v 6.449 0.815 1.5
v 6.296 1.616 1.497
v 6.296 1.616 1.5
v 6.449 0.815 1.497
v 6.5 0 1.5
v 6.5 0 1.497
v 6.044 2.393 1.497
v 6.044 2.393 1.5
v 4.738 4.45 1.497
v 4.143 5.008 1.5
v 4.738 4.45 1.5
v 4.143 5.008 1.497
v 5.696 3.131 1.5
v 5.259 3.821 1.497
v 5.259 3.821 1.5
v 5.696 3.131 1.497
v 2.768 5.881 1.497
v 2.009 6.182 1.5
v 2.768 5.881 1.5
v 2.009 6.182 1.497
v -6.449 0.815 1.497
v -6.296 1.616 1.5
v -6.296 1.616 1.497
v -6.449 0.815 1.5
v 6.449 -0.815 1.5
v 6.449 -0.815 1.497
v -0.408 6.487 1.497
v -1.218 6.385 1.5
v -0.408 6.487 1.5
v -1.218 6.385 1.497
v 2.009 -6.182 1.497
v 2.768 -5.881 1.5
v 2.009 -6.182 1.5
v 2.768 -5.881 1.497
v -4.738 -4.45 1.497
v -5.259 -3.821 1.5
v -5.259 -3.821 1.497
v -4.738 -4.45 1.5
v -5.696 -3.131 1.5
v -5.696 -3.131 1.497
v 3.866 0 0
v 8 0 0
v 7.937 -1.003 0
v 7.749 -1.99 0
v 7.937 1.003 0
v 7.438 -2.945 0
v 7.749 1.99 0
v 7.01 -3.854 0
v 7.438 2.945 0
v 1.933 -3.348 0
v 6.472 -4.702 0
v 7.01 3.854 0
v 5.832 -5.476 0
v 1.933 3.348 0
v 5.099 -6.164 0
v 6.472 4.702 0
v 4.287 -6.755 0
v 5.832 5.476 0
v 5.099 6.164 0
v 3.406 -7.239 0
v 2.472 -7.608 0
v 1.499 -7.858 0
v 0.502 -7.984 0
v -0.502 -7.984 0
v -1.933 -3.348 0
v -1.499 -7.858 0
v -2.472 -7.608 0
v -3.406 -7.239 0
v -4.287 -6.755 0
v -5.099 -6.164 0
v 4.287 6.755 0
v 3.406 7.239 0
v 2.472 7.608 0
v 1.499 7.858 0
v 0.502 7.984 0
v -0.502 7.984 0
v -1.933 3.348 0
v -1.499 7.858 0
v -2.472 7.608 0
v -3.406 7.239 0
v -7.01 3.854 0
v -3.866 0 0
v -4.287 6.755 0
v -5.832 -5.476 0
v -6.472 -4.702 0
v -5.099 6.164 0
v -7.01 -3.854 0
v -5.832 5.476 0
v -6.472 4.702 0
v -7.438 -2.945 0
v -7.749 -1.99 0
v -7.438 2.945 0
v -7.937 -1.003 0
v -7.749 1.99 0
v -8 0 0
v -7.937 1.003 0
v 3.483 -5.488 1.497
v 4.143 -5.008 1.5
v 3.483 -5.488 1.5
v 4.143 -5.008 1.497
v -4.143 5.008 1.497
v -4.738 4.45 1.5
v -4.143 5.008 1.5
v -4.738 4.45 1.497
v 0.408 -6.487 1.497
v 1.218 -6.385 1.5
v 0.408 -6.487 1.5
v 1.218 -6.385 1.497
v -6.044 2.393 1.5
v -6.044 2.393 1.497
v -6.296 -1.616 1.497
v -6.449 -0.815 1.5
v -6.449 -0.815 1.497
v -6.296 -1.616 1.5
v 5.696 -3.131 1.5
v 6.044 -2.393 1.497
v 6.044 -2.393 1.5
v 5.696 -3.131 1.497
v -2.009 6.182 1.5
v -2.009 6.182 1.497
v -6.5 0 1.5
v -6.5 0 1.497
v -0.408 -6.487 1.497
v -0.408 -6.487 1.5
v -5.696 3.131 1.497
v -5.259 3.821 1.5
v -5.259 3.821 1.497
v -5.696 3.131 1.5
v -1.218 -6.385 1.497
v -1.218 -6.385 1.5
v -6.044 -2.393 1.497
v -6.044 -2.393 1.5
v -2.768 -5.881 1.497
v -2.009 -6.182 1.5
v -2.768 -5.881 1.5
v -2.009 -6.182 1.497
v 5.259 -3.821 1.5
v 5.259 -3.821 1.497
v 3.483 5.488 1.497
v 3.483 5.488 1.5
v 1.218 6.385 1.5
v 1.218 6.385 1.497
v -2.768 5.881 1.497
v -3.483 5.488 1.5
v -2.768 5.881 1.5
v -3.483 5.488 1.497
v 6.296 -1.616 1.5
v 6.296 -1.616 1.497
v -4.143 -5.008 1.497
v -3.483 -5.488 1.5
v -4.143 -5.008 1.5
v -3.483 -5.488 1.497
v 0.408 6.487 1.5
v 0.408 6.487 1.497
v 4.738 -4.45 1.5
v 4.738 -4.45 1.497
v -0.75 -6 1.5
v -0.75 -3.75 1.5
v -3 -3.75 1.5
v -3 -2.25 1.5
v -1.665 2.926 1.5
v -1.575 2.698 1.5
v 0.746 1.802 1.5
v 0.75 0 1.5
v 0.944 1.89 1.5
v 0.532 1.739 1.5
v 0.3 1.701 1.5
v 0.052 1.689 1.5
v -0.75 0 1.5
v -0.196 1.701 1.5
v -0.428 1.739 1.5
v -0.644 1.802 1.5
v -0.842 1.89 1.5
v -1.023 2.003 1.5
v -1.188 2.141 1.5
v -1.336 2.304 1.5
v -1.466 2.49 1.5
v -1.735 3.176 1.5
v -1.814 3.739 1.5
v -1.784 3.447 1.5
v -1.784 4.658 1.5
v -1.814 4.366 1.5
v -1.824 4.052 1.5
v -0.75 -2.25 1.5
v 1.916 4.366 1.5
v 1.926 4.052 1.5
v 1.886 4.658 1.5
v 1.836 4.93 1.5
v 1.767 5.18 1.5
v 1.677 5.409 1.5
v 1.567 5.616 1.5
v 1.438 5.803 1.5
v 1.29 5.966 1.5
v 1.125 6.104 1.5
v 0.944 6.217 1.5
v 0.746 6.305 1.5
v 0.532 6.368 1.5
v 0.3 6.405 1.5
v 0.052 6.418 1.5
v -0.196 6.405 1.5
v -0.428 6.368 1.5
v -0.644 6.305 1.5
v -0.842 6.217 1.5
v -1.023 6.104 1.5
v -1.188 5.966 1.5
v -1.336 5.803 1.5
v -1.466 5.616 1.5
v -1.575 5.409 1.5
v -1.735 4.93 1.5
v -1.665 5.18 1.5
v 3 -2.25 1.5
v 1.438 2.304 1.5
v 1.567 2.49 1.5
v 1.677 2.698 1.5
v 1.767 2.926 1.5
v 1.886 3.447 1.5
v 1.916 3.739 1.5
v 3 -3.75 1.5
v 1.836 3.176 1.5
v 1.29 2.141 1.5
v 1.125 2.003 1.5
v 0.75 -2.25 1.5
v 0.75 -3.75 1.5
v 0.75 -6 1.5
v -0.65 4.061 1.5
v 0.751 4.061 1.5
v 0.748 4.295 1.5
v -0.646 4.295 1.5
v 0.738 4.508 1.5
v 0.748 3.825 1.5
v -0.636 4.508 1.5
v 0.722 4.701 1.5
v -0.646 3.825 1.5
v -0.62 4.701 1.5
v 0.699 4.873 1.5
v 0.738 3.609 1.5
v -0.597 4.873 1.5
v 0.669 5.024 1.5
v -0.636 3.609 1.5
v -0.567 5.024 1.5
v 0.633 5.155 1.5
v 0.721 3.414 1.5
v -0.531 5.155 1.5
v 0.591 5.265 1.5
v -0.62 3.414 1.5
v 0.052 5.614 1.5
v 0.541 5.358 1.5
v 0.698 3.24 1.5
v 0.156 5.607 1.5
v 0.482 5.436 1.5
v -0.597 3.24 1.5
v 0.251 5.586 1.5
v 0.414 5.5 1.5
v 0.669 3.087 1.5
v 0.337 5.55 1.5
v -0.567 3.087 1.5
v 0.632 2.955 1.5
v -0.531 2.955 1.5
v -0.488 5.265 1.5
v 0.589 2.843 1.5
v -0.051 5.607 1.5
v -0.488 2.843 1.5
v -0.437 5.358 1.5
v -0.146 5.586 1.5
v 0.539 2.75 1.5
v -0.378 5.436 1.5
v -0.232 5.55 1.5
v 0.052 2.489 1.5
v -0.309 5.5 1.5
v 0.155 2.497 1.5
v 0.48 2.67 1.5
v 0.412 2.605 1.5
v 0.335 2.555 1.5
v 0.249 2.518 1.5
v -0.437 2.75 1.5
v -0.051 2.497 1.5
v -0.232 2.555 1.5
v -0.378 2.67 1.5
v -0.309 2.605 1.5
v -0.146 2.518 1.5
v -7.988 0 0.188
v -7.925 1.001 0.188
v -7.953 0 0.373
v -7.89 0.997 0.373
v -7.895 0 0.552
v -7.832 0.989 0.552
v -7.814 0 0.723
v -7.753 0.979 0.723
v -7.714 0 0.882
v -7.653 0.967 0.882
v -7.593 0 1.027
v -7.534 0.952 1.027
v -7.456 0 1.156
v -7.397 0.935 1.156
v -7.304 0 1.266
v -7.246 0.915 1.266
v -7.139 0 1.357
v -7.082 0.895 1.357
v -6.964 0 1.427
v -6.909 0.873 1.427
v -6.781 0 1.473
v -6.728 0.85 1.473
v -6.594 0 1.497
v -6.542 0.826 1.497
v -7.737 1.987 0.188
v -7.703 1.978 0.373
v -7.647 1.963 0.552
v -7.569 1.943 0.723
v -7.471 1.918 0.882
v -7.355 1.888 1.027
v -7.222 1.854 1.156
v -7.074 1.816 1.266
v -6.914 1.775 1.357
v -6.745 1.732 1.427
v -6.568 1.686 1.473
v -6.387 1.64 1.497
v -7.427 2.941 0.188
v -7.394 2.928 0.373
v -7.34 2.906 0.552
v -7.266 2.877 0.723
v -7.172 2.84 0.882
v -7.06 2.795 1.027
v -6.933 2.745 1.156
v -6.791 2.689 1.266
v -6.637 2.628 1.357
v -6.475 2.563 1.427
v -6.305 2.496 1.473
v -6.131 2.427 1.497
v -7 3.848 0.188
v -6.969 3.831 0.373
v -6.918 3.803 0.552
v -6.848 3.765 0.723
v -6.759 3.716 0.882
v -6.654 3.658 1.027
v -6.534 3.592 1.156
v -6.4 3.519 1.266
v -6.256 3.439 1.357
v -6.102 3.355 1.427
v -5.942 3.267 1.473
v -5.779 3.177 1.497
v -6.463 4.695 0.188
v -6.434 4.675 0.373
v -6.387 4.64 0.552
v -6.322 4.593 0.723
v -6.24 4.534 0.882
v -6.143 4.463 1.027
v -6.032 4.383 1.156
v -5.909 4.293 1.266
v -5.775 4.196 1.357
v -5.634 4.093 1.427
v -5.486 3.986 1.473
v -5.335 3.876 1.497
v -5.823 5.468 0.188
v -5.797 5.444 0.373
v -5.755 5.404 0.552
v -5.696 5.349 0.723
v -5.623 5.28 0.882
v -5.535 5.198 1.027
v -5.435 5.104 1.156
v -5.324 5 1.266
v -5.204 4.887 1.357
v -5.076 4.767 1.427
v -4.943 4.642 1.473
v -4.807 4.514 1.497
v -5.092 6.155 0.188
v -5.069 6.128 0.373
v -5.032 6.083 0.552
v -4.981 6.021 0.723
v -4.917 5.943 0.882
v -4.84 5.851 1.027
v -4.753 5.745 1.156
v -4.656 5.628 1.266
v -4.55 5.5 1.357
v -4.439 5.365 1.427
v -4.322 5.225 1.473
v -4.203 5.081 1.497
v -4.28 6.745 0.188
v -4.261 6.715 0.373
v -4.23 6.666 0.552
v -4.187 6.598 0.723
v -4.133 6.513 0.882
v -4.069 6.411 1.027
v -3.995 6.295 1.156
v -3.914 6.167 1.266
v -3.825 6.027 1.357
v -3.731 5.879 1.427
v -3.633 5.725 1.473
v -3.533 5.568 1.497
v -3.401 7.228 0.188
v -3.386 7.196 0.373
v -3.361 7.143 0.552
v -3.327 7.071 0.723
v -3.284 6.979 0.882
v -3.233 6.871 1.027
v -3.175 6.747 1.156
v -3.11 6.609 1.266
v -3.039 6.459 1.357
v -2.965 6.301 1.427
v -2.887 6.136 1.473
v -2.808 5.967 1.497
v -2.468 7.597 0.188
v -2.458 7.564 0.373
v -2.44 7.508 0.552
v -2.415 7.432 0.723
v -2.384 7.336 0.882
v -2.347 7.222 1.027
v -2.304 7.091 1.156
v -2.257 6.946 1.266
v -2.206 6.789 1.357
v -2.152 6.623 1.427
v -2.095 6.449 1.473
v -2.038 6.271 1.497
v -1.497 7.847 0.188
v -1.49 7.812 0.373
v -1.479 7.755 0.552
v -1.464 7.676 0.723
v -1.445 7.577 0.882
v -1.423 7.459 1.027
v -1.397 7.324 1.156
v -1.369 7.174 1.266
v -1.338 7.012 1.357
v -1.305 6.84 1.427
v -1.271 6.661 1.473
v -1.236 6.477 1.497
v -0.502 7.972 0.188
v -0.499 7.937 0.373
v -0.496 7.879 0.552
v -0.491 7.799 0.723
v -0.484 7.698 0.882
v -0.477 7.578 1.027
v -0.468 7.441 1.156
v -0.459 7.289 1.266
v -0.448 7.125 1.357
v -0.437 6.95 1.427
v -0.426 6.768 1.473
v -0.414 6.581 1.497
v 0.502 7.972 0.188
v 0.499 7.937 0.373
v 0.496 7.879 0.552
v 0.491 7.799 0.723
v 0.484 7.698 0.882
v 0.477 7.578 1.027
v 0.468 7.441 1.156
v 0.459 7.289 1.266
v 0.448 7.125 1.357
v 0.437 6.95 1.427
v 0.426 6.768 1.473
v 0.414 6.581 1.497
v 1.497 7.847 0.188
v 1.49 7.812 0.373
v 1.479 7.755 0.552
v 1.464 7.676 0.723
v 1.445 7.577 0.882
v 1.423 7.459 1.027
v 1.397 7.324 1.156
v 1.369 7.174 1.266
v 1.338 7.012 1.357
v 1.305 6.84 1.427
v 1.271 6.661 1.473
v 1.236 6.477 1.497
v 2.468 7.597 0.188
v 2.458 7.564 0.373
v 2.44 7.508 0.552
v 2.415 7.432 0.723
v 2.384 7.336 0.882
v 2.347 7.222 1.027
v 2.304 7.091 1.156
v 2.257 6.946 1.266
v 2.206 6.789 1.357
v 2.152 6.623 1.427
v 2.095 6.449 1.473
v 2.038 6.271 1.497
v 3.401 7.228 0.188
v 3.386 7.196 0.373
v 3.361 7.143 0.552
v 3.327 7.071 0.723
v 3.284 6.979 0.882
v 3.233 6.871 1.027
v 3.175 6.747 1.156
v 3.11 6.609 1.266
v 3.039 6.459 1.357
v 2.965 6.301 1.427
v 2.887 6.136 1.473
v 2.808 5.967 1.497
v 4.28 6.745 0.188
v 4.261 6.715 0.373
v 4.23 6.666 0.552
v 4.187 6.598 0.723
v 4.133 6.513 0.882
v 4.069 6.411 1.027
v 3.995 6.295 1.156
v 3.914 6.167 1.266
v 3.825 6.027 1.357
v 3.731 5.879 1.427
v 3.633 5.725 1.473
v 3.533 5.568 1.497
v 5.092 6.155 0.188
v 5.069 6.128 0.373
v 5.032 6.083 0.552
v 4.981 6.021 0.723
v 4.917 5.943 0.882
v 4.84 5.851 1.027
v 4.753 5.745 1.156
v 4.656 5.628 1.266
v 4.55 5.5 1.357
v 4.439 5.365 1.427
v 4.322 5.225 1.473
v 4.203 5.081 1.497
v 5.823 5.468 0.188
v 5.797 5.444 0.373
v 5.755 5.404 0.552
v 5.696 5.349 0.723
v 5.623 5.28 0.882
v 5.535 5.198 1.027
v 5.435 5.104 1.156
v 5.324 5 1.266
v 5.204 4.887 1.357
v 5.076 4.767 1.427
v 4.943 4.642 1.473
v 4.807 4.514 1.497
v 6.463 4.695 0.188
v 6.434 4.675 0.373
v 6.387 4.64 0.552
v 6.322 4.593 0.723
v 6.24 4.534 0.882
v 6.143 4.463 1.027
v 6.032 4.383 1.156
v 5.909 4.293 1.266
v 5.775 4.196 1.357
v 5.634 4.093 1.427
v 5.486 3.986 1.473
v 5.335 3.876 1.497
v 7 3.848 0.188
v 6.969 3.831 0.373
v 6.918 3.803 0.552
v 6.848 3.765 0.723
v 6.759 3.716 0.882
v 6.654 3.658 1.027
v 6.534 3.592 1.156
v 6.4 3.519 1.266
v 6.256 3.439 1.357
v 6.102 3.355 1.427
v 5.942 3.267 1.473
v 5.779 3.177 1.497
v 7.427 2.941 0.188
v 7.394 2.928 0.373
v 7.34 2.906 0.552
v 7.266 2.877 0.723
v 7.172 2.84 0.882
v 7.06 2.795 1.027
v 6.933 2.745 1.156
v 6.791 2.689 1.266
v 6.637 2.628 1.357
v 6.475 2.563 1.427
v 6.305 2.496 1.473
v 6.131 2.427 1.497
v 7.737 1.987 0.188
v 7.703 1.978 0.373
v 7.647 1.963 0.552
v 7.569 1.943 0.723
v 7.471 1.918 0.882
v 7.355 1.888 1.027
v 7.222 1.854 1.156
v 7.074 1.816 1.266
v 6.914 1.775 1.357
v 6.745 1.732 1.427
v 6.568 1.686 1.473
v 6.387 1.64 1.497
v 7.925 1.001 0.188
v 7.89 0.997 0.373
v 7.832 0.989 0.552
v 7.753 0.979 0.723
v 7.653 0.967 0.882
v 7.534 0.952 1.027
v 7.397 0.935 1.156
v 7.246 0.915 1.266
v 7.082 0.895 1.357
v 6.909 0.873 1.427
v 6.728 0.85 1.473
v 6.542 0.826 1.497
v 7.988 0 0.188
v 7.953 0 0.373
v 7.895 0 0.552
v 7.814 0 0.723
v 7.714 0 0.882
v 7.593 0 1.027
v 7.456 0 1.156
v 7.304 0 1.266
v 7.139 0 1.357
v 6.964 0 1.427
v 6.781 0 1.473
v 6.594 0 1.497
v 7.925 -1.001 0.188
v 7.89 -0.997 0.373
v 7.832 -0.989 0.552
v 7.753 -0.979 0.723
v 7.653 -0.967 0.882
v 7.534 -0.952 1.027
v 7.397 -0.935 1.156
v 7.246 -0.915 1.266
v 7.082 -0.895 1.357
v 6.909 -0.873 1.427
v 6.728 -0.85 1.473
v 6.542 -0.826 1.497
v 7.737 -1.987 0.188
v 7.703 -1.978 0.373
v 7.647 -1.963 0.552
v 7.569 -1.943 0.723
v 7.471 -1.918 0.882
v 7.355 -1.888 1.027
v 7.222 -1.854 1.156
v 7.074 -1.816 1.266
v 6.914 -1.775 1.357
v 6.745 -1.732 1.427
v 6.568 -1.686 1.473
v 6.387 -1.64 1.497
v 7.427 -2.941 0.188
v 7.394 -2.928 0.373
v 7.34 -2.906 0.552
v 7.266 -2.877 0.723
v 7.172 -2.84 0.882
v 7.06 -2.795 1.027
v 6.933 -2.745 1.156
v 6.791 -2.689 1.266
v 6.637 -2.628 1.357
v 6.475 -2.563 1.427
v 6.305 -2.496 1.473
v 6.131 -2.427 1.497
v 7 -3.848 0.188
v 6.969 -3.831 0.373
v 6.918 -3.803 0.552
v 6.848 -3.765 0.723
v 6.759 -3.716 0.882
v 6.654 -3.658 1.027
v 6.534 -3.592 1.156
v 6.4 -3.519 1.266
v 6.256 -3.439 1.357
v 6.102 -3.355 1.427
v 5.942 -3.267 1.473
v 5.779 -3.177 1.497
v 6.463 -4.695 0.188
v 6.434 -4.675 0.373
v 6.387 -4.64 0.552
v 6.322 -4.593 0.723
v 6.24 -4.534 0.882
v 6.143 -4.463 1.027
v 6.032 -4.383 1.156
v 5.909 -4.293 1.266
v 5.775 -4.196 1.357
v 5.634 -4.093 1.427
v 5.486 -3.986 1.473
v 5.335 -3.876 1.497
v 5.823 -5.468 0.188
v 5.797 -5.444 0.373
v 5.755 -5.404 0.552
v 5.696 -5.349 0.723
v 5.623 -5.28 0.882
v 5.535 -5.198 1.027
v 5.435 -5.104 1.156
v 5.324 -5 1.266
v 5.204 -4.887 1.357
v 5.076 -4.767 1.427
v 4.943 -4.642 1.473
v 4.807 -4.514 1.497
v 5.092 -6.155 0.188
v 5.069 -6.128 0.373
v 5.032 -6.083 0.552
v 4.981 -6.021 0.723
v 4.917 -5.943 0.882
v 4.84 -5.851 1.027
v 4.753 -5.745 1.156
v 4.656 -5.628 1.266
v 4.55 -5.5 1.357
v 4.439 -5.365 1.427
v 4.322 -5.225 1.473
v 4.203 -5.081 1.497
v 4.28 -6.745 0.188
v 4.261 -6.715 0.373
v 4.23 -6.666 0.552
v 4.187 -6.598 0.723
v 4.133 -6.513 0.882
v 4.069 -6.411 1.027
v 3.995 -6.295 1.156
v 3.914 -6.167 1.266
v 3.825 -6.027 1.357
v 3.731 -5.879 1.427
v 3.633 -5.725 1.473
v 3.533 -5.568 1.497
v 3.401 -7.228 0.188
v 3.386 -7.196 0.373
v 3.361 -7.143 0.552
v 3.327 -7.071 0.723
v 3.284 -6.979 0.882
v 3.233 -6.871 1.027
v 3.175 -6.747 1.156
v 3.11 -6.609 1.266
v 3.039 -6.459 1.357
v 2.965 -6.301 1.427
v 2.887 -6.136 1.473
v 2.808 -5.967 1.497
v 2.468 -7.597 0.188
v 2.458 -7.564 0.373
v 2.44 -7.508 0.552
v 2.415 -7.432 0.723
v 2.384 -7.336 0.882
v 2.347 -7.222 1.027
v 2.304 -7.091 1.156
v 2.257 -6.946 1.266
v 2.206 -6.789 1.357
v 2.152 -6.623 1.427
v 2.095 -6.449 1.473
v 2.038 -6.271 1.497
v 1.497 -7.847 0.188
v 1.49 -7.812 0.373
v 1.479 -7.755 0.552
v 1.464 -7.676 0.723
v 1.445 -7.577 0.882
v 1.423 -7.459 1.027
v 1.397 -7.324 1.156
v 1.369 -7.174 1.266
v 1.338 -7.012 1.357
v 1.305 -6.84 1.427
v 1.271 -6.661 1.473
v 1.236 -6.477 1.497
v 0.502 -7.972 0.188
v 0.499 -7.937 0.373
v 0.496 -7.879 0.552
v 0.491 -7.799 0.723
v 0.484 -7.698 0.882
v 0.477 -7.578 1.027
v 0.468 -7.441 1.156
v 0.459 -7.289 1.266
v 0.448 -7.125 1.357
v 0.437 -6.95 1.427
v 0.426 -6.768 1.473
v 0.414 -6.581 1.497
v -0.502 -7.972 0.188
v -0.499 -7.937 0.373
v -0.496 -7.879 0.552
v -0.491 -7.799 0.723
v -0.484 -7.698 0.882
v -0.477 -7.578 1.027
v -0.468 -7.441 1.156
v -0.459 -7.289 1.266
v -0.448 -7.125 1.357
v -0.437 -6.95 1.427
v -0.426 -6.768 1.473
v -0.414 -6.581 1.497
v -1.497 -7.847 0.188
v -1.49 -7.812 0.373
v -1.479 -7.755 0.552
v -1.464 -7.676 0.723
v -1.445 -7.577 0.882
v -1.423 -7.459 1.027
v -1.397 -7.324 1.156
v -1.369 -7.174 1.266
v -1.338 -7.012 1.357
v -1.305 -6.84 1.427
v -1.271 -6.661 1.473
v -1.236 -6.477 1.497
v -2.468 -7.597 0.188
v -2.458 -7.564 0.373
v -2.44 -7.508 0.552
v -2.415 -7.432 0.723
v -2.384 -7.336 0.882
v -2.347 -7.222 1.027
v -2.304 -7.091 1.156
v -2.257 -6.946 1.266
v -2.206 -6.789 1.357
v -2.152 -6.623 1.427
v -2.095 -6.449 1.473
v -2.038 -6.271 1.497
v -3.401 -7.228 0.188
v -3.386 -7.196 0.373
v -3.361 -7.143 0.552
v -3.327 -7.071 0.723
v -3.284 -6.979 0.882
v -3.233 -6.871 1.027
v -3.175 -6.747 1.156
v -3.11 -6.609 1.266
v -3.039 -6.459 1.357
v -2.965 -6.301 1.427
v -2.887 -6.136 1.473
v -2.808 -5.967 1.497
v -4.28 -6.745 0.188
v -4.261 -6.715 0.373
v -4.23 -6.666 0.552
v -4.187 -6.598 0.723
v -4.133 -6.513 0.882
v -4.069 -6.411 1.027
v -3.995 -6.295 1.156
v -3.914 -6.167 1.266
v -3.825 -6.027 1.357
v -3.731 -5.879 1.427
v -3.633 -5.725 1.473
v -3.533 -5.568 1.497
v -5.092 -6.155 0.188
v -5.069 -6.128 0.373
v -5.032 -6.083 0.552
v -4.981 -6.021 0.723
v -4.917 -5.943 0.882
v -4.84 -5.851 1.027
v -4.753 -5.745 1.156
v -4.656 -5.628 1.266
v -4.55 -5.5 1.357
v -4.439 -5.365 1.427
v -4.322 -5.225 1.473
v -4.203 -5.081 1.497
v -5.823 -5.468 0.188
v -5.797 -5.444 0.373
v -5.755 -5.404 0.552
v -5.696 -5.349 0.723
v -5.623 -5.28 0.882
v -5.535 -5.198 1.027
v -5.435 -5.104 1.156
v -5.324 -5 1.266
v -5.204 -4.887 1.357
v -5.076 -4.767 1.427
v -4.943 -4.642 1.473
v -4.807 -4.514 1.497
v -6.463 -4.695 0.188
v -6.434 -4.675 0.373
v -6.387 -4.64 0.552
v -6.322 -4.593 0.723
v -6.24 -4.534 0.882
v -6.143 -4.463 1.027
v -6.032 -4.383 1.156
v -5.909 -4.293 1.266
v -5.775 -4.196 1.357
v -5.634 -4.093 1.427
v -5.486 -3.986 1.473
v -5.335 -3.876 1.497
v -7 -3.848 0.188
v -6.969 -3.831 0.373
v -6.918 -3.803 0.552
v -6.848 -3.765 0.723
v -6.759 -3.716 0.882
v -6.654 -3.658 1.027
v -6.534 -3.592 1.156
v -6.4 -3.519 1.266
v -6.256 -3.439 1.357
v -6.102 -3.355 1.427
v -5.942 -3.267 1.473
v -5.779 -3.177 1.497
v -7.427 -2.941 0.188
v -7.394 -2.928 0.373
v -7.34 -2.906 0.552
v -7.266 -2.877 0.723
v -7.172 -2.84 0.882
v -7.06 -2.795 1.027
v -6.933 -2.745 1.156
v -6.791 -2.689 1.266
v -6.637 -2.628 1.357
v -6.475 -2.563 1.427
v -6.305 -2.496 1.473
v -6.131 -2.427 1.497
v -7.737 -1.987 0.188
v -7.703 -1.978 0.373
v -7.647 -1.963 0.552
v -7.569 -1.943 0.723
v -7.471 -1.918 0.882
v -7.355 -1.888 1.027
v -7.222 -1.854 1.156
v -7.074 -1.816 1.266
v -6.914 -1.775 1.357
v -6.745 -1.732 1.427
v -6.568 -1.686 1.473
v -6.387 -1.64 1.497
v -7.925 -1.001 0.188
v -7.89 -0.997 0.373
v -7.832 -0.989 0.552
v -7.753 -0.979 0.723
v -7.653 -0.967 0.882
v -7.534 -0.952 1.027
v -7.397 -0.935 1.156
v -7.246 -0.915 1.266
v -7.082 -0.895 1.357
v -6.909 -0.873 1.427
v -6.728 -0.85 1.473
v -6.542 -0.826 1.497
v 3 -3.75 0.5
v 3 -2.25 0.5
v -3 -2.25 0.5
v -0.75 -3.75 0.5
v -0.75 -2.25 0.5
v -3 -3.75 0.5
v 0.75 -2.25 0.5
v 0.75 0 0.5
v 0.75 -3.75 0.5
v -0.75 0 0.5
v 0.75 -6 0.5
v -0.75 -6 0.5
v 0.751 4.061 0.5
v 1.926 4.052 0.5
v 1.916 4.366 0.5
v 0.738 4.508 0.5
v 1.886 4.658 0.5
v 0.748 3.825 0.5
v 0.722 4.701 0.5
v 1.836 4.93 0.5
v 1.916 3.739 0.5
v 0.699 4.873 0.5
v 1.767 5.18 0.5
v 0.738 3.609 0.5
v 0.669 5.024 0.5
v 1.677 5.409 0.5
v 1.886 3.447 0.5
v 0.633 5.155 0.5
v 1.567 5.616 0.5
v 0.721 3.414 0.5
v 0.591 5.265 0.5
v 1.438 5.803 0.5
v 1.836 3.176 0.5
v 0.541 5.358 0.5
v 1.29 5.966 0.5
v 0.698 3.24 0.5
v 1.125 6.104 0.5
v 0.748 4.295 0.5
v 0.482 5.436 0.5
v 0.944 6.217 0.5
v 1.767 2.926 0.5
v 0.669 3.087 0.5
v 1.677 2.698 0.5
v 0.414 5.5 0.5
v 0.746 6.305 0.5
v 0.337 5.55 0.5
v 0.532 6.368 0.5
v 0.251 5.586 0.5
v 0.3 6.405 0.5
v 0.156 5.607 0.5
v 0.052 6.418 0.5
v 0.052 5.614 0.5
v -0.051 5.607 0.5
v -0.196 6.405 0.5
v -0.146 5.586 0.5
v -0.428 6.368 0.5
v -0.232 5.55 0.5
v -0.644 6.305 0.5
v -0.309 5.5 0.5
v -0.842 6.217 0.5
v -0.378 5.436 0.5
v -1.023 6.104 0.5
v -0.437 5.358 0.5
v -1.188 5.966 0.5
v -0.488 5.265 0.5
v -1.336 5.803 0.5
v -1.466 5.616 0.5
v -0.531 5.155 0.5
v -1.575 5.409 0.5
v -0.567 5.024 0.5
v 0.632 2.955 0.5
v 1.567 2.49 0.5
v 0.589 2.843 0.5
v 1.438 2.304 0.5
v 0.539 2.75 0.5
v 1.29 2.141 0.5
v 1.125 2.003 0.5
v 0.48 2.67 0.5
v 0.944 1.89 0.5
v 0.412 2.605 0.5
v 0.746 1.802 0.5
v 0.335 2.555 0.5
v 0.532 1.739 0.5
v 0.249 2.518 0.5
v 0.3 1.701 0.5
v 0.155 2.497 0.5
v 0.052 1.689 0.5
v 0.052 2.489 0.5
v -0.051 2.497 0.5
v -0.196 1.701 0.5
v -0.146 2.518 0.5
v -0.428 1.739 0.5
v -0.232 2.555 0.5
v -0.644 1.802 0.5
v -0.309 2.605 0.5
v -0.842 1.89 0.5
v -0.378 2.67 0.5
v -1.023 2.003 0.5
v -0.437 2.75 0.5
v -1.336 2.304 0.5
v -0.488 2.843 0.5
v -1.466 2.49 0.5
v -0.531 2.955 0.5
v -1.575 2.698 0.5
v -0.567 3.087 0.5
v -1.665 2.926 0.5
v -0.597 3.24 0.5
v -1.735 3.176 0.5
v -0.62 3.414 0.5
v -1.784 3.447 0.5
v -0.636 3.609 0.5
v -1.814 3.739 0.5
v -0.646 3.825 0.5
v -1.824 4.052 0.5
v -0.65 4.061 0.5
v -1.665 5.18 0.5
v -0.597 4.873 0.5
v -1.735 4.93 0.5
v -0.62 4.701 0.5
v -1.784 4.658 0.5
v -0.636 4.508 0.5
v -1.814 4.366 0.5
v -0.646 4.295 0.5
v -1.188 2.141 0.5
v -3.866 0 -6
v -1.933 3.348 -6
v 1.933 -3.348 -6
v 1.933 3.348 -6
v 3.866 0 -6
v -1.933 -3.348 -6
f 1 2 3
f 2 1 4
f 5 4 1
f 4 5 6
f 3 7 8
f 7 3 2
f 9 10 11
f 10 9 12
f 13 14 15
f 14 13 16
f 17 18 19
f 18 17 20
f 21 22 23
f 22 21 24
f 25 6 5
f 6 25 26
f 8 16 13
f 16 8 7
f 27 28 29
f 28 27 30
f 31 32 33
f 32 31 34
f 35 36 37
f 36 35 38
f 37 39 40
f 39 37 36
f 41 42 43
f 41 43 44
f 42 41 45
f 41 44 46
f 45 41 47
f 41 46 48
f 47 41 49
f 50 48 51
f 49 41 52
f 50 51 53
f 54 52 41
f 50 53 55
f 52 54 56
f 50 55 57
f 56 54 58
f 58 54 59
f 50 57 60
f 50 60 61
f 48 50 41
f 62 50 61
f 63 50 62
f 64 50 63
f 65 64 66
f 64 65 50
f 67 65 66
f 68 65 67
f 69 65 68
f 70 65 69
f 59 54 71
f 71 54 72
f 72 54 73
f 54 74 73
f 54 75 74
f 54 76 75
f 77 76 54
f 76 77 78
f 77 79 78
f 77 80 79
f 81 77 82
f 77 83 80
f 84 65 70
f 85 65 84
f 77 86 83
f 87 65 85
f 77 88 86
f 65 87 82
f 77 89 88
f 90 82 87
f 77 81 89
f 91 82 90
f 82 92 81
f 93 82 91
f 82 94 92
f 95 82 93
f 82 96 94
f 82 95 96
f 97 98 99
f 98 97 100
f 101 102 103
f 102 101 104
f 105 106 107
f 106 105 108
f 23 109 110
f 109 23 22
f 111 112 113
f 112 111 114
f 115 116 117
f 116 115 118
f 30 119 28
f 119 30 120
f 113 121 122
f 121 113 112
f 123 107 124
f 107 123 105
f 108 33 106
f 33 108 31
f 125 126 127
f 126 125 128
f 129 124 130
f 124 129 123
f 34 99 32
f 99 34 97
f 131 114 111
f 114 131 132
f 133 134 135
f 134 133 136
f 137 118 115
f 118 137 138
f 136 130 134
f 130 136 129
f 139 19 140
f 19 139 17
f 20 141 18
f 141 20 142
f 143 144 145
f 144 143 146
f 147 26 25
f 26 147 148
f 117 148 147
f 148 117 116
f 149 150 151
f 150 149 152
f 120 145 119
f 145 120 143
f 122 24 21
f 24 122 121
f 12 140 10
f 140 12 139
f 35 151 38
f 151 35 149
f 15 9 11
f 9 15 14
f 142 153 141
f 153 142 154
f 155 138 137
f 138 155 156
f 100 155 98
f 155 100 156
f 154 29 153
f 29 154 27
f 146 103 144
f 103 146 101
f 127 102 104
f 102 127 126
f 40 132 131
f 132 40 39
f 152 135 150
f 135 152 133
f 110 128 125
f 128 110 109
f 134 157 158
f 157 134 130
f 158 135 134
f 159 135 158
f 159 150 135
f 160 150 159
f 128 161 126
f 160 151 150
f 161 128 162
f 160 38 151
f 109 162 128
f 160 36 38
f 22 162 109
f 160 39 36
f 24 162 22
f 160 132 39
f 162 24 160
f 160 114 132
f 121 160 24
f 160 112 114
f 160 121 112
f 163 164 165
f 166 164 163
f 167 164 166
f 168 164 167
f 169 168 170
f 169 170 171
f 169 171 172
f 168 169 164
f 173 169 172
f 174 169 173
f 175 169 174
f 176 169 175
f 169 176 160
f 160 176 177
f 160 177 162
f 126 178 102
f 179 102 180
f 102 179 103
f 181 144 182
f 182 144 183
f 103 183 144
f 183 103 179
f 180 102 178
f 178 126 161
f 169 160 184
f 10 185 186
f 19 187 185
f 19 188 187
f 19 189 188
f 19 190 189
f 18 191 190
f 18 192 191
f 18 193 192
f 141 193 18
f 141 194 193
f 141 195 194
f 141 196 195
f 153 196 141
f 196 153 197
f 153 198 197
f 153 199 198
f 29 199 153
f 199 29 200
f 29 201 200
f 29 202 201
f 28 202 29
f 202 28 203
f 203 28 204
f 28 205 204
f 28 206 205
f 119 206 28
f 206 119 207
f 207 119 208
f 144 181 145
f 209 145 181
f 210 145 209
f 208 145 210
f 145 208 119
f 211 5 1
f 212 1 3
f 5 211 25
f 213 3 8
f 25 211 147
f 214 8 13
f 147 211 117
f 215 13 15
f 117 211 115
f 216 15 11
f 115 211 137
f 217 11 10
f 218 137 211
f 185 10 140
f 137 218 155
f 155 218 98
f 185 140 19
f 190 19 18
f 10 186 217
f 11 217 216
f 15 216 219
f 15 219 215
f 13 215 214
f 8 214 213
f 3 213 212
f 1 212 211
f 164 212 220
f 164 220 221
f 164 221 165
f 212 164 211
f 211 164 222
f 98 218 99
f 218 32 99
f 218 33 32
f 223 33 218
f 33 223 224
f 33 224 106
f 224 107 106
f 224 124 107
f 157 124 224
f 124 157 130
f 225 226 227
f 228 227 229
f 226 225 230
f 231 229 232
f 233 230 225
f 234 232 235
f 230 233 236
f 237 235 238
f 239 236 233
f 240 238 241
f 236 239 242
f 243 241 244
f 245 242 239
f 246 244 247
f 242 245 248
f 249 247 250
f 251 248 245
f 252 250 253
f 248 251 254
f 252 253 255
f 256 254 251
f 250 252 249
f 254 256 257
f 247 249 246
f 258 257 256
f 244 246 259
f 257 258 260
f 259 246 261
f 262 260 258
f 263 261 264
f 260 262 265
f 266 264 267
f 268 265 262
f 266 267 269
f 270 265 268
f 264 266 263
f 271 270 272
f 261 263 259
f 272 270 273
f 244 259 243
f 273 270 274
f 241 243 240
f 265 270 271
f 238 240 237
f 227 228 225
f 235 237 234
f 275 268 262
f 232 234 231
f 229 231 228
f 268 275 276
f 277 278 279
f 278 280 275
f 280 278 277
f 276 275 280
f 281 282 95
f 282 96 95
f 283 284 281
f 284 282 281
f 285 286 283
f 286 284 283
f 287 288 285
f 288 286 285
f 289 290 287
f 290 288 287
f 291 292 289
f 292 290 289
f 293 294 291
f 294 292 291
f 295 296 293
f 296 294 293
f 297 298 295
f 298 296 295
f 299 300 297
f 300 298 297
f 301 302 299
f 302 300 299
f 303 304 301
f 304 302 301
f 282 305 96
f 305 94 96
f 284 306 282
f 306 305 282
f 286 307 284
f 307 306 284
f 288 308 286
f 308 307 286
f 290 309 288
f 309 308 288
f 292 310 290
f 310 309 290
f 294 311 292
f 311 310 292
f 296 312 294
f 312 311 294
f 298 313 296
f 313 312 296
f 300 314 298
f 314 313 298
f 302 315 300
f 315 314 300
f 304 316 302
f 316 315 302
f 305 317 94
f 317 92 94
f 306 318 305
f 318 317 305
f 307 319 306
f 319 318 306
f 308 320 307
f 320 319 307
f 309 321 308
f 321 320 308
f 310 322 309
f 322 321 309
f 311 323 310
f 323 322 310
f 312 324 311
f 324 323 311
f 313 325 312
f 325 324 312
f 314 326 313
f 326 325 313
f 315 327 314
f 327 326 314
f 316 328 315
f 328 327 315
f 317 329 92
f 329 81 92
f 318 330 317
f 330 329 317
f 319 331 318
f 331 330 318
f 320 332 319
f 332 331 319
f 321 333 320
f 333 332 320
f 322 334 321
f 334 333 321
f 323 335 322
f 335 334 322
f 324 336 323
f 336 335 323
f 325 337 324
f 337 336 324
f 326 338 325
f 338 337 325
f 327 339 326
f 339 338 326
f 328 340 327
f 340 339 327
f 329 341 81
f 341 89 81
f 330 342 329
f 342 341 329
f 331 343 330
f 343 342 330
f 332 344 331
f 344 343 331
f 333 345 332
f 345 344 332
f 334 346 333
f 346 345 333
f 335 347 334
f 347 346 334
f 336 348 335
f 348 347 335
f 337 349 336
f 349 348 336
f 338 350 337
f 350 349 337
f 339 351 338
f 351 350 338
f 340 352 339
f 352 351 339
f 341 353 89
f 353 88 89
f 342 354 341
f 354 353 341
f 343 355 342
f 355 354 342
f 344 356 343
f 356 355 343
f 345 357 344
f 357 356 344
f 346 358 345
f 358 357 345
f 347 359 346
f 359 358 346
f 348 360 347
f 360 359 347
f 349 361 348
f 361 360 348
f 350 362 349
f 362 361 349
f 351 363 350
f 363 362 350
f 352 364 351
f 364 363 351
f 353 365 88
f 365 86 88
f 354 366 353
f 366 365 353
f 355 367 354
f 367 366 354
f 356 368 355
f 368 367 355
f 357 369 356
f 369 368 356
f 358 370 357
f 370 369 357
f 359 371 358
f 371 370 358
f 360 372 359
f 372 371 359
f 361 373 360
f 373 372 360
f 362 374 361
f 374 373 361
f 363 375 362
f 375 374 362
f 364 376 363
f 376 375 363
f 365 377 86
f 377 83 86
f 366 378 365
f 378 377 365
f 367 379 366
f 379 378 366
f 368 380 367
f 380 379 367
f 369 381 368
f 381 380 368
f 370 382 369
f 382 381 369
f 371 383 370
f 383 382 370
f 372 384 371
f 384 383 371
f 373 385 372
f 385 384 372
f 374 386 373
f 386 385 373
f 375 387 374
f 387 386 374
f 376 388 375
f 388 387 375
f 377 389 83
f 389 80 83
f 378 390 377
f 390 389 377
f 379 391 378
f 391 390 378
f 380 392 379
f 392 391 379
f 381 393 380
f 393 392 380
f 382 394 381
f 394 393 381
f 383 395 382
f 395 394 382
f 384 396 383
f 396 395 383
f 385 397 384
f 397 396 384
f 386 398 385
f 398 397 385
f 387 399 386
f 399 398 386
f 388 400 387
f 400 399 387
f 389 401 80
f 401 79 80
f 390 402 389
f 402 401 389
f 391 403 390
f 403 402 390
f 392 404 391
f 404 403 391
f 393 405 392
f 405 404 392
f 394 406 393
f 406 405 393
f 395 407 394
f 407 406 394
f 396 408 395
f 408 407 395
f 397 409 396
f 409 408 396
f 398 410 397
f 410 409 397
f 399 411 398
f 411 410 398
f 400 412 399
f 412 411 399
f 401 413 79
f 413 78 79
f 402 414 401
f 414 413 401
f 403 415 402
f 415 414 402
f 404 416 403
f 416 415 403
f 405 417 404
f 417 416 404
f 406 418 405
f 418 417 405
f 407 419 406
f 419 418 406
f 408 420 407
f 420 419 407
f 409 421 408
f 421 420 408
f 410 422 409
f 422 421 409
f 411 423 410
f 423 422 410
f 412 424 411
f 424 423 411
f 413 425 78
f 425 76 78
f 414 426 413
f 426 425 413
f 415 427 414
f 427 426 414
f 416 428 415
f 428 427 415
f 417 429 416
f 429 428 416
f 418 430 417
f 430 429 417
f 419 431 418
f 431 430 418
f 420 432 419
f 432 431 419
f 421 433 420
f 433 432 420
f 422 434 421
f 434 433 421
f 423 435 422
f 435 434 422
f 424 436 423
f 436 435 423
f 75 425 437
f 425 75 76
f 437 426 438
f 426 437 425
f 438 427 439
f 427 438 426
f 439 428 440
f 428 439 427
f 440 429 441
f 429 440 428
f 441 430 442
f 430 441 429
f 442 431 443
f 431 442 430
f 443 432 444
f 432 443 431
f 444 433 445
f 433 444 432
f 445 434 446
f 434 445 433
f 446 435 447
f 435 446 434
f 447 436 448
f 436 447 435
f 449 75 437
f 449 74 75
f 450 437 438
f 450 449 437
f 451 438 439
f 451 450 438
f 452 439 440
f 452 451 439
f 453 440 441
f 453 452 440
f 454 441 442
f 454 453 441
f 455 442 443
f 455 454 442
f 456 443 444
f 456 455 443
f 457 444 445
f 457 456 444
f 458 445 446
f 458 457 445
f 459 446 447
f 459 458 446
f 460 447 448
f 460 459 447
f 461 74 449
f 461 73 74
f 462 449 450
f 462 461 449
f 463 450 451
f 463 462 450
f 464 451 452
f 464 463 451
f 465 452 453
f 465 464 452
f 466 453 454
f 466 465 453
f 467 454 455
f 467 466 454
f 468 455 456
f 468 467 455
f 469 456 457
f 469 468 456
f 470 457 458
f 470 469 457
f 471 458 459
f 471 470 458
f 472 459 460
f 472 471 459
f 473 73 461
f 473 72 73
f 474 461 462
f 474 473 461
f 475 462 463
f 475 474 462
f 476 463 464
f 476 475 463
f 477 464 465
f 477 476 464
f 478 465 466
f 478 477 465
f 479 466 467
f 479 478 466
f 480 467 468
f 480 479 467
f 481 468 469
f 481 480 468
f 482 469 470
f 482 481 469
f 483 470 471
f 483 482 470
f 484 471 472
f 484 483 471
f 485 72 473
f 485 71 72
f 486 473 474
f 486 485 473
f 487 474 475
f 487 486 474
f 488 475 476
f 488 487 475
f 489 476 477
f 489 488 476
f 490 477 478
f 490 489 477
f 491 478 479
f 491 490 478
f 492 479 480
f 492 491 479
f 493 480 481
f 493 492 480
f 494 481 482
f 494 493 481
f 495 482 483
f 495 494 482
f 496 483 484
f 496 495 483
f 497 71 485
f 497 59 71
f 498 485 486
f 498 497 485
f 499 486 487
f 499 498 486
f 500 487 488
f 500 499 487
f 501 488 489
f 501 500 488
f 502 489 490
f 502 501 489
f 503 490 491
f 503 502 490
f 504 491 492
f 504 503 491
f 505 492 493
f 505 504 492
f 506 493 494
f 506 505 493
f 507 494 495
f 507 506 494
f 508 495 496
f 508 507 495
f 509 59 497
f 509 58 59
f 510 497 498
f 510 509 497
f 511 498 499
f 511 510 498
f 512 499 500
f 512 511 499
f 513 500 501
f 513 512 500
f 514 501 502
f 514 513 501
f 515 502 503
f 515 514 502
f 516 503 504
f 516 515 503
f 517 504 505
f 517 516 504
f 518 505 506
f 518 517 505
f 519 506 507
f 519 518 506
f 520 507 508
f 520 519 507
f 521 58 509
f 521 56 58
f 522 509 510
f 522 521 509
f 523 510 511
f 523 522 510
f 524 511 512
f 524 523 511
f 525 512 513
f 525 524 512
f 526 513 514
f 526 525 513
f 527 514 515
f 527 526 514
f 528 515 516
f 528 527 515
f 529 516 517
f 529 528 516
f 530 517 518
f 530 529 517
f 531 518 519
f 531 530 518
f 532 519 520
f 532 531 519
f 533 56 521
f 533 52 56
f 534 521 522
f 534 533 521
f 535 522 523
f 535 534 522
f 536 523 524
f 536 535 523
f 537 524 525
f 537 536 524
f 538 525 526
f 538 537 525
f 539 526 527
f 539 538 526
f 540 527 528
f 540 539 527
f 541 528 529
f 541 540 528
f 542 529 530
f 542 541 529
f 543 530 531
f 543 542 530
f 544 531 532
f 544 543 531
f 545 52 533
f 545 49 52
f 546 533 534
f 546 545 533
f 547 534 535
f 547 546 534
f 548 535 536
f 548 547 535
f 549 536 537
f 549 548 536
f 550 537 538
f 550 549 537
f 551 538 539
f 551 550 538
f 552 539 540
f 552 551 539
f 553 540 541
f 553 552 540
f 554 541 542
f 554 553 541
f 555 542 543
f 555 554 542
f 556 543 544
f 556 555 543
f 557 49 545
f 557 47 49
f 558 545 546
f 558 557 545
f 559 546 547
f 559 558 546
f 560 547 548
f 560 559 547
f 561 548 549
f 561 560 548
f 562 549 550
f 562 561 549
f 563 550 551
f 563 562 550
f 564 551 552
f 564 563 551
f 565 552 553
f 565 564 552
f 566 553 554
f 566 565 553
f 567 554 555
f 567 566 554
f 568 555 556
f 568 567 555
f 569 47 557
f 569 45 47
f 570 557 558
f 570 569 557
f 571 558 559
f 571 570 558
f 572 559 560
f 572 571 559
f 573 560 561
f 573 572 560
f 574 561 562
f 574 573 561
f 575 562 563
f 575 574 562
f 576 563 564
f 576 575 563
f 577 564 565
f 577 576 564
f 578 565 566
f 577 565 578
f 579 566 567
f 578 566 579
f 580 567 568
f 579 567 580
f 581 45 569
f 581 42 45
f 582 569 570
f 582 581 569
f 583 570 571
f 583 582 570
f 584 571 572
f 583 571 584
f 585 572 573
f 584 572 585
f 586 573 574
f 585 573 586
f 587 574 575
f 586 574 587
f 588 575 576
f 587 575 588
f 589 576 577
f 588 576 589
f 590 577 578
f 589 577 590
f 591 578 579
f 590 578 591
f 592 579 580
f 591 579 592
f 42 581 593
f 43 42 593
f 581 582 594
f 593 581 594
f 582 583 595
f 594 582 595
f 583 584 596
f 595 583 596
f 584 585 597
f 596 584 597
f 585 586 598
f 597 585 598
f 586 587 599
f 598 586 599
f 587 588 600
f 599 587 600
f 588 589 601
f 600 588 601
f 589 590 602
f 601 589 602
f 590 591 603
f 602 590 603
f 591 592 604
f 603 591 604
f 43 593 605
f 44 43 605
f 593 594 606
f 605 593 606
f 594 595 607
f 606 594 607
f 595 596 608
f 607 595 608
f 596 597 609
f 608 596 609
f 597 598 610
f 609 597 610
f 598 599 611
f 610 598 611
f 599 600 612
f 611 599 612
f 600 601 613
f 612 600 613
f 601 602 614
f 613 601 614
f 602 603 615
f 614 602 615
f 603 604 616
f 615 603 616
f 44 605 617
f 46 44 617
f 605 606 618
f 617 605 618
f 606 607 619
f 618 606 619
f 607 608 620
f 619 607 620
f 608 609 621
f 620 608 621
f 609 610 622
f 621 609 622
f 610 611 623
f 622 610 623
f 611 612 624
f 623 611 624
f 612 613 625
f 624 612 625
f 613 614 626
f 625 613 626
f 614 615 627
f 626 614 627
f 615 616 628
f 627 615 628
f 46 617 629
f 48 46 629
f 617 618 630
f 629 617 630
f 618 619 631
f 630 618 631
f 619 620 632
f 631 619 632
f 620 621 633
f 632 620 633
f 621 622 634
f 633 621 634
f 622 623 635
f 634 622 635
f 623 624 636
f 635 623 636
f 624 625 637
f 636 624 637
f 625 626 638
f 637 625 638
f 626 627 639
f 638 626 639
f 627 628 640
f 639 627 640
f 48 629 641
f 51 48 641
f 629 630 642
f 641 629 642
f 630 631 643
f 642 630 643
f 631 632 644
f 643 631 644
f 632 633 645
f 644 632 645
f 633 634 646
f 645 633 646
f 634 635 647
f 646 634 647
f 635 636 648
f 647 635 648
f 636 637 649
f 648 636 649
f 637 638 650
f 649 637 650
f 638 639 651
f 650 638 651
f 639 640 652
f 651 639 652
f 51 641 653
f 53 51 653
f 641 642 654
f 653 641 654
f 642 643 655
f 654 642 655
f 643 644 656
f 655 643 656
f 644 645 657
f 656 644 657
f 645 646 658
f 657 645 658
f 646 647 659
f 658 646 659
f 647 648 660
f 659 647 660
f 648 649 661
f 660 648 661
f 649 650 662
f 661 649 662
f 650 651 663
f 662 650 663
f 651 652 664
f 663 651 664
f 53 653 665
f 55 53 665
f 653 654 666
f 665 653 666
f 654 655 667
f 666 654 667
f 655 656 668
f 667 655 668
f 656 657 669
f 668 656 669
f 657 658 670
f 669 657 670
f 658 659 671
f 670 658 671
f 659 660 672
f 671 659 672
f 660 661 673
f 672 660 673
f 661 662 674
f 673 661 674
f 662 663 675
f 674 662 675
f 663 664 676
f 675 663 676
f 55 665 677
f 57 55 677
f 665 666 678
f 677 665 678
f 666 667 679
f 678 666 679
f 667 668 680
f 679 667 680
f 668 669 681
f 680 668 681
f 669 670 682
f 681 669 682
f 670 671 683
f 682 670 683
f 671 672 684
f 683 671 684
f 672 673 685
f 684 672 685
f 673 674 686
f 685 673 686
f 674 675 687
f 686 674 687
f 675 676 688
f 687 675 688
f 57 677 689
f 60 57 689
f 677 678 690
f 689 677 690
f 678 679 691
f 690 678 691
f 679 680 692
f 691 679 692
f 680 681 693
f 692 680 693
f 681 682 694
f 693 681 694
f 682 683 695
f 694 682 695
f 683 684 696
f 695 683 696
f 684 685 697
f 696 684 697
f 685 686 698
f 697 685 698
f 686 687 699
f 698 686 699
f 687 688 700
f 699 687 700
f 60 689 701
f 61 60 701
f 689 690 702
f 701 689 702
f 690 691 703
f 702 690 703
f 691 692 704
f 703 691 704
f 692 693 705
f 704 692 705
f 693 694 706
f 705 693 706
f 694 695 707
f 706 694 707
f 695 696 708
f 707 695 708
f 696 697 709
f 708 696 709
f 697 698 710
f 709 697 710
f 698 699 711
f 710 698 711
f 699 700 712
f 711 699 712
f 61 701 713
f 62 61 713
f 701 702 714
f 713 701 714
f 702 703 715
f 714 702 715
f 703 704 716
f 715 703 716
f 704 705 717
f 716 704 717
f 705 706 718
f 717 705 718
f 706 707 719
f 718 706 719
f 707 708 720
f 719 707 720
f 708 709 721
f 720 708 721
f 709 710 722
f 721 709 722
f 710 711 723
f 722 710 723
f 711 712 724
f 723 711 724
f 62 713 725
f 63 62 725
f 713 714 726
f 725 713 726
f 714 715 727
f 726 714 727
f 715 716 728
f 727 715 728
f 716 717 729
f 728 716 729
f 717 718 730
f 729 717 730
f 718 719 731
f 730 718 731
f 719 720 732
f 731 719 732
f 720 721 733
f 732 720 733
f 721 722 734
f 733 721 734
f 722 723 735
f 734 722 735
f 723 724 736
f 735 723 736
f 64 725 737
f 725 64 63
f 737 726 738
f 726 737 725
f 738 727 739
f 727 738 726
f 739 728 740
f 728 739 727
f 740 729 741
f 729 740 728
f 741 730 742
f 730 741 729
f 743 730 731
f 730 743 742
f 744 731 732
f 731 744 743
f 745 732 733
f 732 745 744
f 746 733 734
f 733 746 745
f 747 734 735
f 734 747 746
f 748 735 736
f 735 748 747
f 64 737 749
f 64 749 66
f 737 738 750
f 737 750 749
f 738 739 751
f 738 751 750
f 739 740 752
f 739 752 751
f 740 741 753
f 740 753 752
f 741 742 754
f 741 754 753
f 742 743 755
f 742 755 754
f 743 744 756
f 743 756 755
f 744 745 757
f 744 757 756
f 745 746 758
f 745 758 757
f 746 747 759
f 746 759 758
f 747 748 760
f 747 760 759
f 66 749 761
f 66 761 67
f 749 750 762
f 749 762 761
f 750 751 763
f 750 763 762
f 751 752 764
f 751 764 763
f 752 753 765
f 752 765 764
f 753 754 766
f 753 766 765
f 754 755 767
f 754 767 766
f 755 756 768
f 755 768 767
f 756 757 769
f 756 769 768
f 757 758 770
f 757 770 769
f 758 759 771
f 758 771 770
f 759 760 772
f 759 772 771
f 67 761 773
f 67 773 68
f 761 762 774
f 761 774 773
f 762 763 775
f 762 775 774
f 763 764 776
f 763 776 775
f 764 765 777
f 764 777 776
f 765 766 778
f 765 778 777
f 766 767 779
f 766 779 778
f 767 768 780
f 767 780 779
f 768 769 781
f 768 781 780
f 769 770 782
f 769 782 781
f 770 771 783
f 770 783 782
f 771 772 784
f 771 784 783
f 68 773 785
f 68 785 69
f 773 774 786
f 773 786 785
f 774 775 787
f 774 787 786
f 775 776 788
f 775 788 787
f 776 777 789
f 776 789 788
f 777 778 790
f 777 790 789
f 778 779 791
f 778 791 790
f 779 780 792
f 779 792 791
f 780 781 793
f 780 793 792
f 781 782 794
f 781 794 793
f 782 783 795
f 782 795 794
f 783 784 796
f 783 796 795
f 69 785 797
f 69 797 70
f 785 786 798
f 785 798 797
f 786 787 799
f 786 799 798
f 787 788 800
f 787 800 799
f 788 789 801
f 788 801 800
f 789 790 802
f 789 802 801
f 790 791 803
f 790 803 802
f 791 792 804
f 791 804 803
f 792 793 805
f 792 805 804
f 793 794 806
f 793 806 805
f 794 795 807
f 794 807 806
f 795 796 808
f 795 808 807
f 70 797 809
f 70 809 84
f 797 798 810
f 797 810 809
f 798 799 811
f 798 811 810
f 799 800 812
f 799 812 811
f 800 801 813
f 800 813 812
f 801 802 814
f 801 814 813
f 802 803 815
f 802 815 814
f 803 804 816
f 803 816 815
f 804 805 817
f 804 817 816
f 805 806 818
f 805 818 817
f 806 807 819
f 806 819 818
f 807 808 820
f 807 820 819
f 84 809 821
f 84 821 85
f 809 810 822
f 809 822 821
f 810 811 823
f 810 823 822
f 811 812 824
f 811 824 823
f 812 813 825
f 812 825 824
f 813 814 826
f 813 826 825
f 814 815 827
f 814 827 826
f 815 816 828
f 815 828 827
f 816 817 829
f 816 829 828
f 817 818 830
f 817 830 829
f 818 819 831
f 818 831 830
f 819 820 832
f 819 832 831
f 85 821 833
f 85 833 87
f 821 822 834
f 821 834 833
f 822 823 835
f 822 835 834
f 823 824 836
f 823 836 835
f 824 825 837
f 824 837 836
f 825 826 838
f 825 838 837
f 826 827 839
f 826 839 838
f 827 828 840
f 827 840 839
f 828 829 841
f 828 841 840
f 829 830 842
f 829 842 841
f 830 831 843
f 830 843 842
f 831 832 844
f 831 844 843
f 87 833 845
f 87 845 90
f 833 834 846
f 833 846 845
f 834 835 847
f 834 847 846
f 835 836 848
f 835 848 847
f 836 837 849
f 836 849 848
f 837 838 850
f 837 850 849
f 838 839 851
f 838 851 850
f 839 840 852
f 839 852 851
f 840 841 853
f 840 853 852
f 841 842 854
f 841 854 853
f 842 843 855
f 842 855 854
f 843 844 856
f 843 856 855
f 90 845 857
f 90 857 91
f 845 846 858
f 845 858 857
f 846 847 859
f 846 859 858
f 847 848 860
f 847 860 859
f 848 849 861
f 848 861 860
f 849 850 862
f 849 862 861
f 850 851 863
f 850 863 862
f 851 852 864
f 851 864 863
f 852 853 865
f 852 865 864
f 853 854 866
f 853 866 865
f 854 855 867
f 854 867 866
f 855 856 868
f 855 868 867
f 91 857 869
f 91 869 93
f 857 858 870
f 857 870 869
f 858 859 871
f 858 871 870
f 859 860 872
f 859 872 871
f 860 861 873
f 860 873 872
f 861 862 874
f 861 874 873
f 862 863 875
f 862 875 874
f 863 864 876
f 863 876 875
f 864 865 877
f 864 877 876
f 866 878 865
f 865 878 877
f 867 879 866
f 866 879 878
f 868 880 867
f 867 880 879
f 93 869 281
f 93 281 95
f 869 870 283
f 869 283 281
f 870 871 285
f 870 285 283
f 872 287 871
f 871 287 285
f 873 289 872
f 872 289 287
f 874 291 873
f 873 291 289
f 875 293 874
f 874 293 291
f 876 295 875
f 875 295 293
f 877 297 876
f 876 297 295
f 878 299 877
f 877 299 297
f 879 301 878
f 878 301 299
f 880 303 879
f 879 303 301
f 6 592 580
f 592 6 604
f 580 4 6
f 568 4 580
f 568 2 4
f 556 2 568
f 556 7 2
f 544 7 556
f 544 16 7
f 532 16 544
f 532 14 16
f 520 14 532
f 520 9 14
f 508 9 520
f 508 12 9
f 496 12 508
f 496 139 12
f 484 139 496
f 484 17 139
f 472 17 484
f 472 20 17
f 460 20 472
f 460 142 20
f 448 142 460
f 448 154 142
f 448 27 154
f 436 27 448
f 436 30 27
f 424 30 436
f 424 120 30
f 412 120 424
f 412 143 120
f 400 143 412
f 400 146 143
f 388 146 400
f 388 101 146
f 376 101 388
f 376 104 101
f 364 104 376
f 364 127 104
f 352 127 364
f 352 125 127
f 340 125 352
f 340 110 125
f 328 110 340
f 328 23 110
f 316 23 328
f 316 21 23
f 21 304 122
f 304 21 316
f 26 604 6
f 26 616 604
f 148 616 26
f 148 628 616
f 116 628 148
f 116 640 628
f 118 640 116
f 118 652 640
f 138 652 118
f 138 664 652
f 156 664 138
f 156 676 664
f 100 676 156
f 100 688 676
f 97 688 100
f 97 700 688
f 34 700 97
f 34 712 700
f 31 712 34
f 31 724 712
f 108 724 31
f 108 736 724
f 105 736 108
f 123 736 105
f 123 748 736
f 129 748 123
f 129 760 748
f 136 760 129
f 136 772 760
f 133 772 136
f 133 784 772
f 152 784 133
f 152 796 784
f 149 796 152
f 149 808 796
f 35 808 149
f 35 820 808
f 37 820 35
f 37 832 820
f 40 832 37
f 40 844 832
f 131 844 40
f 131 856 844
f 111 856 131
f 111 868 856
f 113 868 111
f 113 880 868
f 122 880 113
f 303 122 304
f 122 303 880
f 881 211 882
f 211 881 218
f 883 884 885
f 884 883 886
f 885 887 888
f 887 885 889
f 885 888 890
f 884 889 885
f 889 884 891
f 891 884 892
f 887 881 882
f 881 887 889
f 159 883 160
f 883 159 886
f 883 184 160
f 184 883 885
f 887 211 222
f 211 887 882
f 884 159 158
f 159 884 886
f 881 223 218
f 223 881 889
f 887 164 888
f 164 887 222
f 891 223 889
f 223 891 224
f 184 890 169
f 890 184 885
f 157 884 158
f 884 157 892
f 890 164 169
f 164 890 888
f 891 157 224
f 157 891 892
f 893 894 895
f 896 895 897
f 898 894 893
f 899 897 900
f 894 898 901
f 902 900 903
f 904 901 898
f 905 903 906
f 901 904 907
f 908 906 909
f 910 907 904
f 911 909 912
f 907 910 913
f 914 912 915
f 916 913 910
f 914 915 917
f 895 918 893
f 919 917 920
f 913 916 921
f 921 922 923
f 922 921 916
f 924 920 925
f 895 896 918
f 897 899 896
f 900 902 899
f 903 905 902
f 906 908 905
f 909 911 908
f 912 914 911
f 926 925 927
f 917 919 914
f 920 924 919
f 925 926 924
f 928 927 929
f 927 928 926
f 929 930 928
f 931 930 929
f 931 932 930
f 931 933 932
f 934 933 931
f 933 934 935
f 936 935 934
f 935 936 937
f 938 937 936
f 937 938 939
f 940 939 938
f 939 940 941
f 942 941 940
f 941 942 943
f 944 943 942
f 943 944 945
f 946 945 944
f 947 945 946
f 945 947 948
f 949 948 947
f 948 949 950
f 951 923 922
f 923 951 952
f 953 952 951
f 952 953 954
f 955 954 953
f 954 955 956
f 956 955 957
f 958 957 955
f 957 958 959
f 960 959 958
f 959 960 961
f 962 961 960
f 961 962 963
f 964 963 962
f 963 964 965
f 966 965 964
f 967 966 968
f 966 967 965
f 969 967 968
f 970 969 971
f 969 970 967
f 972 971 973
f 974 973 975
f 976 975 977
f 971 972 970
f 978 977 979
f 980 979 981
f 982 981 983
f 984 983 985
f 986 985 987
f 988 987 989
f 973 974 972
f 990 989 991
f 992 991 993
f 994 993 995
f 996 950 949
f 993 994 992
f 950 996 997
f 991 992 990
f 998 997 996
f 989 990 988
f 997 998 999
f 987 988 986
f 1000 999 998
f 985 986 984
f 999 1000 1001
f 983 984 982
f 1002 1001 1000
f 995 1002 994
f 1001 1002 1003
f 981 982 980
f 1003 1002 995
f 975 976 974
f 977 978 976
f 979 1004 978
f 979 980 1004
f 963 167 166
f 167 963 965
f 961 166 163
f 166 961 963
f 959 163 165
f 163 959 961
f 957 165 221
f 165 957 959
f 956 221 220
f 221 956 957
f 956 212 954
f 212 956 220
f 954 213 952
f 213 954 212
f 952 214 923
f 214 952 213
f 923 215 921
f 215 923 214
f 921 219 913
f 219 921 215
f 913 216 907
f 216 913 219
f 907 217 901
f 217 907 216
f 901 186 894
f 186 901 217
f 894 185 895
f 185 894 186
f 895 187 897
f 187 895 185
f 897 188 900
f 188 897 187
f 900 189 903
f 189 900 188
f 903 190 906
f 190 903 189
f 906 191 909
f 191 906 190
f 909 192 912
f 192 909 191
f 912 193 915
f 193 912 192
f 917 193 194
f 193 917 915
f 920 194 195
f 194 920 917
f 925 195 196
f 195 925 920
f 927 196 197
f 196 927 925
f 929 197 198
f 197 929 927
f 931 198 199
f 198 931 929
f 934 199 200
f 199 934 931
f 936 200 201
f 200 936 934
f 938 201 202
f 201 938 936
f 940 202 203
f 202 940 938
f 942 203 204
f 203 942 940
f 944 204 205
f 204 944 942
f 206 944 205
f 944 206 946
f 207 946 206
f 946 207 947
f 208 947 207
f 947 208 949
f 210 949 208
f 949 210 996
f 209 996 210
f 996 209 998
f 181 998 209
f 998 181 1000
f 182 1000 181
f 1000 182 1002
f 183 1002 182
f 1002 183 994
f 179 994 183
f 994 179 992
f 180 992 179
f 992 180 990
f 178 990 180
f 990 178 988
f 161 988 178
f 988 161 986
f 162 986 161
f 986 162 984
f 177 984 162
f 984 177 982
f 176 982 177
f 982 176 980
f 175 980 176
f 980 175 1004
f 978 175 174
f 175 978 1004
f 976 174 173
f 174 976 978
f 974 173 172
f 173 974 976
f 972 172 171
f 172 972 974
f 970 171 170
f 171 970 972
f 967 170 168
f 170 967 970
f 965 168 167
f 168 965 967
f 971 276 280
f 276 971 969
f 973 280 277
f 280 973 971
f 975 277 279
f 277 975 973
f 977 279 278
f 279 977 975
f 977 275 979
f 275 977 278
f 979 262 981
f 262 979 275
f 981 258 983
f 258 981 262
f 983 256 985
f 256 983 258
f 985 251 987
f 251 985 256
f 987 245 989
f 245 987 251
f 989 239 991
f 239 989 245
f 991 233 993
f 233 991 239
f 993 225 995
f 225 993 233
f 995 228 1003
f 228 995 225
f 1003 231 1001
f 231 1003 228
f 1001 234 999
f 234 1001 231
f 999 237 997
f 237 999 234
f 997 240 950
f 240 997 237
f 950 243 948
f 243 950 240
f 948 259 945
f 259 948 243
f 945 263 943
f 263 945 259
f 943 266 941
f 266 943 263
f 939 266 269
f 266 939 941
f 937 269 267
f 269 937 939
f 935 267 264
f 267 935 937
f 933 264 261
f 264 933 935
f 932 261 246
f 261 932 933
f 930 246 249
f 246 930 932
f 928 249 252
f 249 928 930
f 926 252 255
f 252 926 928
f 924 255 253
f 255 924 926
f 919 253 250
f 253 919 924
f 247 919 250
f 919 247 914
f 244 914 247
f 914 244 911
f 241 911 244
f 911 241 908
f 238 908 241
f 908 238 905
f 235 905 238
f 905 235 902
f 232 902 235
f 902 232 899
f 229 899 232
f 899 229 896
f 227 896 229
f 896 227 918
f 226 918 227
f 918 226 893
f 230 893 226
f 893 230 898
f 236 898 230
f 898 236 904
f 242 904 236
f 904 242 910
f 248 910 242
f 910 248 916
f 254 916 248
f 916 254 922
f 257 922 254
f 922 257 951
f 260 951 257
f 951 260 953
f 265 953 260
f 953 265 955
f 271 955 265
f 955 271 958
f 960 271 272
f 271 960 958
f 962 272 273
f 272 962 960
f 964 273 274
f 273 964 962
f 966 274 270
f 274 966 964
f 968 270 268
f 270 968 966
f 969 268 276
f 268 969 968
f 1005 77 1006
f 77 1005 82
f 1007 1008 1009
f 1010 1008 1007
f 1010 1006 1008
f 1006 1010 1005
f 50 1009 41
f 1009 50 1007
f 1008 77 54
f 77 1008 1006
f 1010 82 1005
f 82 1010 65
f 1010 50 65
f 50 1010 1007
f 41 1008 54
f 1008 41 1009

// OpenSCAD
$fn = 50;


union() {
	difference() {
		union() {
			cylinder(h = 1.5000000000, r = 6.5000000000);
			rotate_extrude(angle = 360) {
				translate(v = [6.5000000000, 0, 0]) {
					circle(r = 1.5000000000);
				}
			}
		}
		union() {
			translate(v = [-25.0000000000, -25.0000000000, -50]) {
				cube(size = [50, 50, 50]);
			}
			#translate(v = [-3.0000000000, -3.7500000000, 0.5000000000]) {
				cube(size = [6, 1.5000000000, 1]);
			}
			#translate(v = [-0.7500000000, -6.0000000000, 0.5000000000]) {
				cube(size = [1.5000000000, 6, 1]);
			}
			#translate(v = [0, 4, 0.5000000000]) {
				linear_extrude(height = 1) {
					text(font = "SegoiUI:Bold", halign = "center", size = 4.5000000000, text = "0", valign = "center");
				}
			}
		}
	}
	union() {
		translate(v = [0, 0, -6]) {
			linear_extrude(height = 6) {
				polygon(points = [[3.8658550000, 0.0000000000], [1.9329275000, 3.3479286373], [-1.9329275000, 3.3479286373], [-3.8658550000, 0.0000000000], [-1.9329275000, -3.3479286373], [1.9329275000, -3.3479286373]]);
			}
		}
	}
}
